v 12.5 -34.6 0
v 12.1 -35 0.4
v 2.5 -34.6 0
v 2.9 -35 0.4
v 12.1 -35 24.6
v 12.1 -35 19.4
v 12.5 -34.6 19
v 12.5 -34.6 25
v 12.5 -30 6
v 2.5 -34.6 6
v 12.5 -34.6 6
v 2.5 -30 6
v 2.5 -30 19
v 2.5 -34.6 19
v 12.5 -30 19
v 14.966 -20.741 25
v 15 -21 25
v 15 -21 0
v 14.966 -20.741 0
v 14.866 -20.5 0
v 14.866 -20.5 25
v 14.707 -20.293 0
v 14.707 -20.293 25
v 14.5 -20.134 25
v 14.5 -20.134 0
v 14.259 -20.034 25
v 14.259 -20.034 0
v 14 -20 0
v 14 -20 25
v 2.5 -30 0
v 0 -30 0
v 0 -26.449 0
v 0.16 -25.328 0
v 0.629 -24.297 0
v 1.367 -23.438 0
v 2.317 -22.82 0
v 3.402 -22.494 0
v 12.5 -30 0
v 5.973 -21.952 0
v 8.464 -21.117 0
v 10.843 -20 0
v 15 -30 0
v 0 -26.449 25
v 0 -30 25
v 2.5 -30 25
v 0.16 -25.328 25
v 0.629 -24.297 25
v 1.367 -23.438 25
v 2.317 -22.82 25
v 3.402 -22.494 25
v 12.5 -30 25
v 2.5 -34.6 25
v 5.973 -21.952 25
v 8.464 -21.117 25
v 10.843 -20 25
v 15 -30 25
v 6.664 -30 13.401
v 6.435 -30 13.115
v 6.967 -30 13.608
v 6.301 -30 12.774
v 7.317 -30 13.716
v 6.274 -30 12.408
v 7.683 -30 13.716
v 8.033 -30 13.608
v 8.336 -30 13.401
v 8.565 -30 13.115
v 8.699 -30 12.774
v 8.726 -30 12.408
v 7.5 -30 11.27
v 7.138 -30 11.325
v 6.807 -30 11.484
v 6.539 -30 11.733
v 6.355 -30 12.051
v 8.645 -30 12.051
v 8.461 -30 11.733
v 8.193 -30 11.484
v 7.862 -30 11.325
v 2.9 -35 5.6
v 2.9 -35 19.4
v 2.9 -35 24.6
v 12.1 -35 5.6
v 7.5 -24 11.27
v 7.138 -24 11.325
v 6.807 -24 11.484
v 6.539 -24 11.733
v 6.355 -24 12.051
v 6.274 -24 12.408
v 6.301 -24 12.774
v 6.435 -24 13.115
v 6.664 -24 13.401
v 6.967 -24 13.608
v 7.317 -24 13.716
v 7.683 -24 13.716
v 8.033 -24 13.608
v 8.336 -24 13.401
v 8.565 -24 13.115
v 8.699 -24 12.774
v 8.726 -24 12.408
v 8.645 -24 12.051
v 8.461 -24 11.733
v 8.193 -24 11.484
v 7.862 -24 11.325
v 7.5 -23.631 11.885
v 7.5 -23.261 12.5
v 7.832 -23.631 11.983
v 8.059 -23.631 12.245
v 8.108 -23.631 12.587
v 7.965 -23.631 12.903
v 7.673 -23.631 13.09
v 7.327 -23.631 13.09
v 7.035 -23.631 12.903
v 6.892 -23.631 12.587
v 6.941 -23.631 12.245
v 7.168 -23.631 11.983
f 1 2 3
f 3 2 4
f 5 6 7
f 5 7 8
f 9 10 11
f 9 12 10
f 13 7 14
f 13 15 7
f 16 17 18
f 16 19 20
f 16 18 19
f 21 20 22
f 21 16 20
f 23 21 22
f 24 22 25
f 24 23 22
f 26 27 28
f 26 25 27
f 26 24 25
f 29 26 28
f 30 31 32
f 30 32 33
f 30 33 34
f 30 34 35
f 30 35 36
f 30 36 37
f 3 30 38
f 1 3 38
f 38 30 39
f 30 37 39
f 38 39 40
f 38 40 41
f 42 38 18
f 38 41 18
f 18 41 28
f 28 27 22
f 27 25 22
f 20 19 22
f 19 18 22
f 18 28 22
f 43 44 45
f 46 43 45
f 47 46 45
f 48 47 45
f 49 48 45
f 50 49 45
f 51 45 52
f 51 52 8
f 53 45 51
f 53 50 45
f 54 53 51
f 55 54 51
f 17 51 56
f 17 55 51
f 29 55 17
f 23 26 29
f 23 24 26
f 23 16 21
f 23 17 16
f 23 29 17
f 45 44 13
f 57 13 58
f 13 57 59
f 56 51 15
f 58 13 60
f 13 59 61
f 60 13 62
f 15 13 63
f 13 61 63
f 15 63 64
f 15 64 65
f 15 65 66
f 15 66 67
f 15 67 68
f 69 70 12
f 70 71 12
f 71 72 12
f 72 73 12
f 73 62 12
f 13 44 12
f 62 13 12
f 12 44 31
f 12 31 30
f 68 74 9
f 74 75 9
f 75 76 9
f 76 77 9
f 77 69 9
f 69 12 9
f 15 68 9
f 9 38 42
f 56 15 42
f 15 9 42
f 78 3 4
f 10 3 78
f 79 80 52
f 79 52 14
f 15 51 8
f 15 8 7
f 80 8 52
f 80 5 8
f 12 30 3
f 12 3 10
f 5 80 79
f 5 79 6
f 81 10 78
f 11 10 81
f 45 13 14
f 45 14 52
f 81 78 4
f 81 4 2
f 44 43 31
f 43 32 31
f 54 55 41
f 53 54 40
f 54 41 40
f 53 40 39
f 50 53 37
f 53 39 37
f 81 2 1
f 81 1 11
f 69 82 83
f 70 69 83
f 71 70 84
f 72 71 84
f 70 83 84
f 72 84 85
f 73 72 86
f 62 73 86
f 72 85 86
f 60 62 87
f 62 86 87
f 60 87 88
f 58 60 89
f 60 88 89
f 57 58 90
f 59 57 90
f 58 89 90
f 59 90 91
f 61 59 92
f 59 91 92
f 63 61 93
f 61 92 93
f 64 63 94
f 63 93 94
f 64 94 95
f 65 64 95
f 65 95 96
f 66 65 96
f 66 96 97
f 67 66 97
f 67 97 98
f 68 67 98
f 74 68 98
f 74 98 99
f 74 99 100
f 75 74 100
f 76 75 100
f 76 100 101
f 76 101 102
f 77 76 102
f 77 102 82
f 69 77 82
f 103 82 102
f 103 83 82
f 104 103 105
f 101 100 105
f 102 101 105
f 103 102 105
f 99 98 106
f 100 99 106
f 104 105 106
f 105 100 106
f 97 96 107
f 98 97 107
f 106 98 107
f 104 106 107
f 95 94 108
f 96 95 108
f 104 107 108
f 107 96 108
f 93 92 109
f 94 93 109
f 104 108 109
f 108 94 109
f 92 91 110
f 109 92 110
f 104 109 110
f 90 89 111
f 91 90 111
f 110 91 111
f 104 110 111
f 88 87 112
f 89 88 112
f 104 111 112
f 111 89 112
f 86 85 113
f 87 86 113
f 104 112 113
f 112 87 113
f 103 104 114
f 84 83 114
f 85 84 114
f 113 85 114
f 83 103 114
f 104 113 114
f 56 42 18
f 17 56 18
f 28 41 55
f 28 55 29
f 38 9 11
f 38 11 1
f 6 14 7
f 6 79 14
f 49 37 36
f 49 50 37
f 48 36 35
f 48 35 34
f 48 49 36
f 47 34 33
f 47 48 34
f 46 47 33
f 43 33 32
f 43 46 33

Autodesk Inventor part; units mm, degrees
ref_plane "YZ Plane" through (0, 0, 0) normal (1, 0, 0) x (0, 1, 0)
ref_plane "XZ Plane" through (0, 0, 0) normal (0, 1, 0) x (-1, 0, 0)
ref_plane "XY Plane" through (0, 0, 0) normal (0, 0, 1) x (1, 0, 0)
sketch "Skizze1" plane through (0, 0, 0) normal (0, 0, 1) x (1, 0, 0)
  circle A0 centre (0, 0) radius 22.75
  line L0 (0, -22.75) -> (0, -30)
  line L1 (0, -30) -> (15, -30)
  line L2 (15, -30) -> (15, -17.1045)
  line L3 (7.5, -17.7699) -> (7.5, -35.7566) construction
  line L4 (10.8426, -20) -> (15, -20)
  point P0 (7.5, -21.4782)
  dimension "d0" = 45.5
  dimension "d1" = 15
  dimension "d2" = 0
  dimension "d3" = 7.5
  dimension "d27" = 30
  dimension "d28" = 10
extrude "Extrusion1" add sketch "Skizze1" along normal blind 25 contours A0 L4 L2 L1 L0
fillet "Rundung1" radius 4 1 edges at (0, -22.75, 12.5)
sketch "Skizze2" plane through (0, -30, 0) normal (0, -1, 0) x (1, 0, 0)
  line L0 (2.5, 25) -> (12.5, 25)
  line L1 (12.5, 25) -> (12.5, 19)
  line L2 (12.5, 19) -> (2.5, 19)
  line L3 (2.5, 19) -> (2.5, 25)
  line L4 (2.5, 6) -> (12.5, 6)
  line L5 (12.5, 6) -> (12.5, 0)
  line L6 (12.5, 0) -> (2.5, 0)
  line L7 (2.5, 0) -> (2.5, 6)
  line L8 (7.5, 27.4511) -> (7.5, -5.4268) construction
  line L9 (0, 0) -> (0, 25) projected
  line L10 (0, 25) -> (15, 25) projected
  line L11 (0, 0) -> (15, 0) projected
  dimension "d8" = 6
  dimension "d9" = 6
  dimension "d10" = 10
  dimension "d11" = 7.5
extrude "Extrusion2" add sketch "Skizze2" along normal blind 5
sketch "Skizze3" plane through (0, -30, 0) normal (0, -1, 0) x (1, 0, 0)
  line L0 (0, 0) -> (0, 25) projected
  line L1 (2.5, 0) -> (12.5, 0) projected
  point P0 (7.5, 12.5)
  dimension "d25" = 7.5
  dimension "d26" = 12.5
hole "Bohrung1" at (7.5, -30, 12.5) direction (0, 1, 0) diameter 2.459 depth 6 tip angle 118 thread size "M3x0.5" class "6H" standard "ISO Metric profile"
fillet "Rundung2" radius 1 1 edges at (15, -20, 12.5)
chamfer "Fase1" distance 0.4 angle 45 8 edges at (7.5, -35, 25) (2.5, -35, 22) (7.5, -35, 19) (12.5, -35, 22) (12.5, -35, 3) (7.5, -35, 6) (2.5, -35, 3) (7.5, -35, 0)
properties part number "103.020.01_Positionsausgleich" material "Polypropylen"
